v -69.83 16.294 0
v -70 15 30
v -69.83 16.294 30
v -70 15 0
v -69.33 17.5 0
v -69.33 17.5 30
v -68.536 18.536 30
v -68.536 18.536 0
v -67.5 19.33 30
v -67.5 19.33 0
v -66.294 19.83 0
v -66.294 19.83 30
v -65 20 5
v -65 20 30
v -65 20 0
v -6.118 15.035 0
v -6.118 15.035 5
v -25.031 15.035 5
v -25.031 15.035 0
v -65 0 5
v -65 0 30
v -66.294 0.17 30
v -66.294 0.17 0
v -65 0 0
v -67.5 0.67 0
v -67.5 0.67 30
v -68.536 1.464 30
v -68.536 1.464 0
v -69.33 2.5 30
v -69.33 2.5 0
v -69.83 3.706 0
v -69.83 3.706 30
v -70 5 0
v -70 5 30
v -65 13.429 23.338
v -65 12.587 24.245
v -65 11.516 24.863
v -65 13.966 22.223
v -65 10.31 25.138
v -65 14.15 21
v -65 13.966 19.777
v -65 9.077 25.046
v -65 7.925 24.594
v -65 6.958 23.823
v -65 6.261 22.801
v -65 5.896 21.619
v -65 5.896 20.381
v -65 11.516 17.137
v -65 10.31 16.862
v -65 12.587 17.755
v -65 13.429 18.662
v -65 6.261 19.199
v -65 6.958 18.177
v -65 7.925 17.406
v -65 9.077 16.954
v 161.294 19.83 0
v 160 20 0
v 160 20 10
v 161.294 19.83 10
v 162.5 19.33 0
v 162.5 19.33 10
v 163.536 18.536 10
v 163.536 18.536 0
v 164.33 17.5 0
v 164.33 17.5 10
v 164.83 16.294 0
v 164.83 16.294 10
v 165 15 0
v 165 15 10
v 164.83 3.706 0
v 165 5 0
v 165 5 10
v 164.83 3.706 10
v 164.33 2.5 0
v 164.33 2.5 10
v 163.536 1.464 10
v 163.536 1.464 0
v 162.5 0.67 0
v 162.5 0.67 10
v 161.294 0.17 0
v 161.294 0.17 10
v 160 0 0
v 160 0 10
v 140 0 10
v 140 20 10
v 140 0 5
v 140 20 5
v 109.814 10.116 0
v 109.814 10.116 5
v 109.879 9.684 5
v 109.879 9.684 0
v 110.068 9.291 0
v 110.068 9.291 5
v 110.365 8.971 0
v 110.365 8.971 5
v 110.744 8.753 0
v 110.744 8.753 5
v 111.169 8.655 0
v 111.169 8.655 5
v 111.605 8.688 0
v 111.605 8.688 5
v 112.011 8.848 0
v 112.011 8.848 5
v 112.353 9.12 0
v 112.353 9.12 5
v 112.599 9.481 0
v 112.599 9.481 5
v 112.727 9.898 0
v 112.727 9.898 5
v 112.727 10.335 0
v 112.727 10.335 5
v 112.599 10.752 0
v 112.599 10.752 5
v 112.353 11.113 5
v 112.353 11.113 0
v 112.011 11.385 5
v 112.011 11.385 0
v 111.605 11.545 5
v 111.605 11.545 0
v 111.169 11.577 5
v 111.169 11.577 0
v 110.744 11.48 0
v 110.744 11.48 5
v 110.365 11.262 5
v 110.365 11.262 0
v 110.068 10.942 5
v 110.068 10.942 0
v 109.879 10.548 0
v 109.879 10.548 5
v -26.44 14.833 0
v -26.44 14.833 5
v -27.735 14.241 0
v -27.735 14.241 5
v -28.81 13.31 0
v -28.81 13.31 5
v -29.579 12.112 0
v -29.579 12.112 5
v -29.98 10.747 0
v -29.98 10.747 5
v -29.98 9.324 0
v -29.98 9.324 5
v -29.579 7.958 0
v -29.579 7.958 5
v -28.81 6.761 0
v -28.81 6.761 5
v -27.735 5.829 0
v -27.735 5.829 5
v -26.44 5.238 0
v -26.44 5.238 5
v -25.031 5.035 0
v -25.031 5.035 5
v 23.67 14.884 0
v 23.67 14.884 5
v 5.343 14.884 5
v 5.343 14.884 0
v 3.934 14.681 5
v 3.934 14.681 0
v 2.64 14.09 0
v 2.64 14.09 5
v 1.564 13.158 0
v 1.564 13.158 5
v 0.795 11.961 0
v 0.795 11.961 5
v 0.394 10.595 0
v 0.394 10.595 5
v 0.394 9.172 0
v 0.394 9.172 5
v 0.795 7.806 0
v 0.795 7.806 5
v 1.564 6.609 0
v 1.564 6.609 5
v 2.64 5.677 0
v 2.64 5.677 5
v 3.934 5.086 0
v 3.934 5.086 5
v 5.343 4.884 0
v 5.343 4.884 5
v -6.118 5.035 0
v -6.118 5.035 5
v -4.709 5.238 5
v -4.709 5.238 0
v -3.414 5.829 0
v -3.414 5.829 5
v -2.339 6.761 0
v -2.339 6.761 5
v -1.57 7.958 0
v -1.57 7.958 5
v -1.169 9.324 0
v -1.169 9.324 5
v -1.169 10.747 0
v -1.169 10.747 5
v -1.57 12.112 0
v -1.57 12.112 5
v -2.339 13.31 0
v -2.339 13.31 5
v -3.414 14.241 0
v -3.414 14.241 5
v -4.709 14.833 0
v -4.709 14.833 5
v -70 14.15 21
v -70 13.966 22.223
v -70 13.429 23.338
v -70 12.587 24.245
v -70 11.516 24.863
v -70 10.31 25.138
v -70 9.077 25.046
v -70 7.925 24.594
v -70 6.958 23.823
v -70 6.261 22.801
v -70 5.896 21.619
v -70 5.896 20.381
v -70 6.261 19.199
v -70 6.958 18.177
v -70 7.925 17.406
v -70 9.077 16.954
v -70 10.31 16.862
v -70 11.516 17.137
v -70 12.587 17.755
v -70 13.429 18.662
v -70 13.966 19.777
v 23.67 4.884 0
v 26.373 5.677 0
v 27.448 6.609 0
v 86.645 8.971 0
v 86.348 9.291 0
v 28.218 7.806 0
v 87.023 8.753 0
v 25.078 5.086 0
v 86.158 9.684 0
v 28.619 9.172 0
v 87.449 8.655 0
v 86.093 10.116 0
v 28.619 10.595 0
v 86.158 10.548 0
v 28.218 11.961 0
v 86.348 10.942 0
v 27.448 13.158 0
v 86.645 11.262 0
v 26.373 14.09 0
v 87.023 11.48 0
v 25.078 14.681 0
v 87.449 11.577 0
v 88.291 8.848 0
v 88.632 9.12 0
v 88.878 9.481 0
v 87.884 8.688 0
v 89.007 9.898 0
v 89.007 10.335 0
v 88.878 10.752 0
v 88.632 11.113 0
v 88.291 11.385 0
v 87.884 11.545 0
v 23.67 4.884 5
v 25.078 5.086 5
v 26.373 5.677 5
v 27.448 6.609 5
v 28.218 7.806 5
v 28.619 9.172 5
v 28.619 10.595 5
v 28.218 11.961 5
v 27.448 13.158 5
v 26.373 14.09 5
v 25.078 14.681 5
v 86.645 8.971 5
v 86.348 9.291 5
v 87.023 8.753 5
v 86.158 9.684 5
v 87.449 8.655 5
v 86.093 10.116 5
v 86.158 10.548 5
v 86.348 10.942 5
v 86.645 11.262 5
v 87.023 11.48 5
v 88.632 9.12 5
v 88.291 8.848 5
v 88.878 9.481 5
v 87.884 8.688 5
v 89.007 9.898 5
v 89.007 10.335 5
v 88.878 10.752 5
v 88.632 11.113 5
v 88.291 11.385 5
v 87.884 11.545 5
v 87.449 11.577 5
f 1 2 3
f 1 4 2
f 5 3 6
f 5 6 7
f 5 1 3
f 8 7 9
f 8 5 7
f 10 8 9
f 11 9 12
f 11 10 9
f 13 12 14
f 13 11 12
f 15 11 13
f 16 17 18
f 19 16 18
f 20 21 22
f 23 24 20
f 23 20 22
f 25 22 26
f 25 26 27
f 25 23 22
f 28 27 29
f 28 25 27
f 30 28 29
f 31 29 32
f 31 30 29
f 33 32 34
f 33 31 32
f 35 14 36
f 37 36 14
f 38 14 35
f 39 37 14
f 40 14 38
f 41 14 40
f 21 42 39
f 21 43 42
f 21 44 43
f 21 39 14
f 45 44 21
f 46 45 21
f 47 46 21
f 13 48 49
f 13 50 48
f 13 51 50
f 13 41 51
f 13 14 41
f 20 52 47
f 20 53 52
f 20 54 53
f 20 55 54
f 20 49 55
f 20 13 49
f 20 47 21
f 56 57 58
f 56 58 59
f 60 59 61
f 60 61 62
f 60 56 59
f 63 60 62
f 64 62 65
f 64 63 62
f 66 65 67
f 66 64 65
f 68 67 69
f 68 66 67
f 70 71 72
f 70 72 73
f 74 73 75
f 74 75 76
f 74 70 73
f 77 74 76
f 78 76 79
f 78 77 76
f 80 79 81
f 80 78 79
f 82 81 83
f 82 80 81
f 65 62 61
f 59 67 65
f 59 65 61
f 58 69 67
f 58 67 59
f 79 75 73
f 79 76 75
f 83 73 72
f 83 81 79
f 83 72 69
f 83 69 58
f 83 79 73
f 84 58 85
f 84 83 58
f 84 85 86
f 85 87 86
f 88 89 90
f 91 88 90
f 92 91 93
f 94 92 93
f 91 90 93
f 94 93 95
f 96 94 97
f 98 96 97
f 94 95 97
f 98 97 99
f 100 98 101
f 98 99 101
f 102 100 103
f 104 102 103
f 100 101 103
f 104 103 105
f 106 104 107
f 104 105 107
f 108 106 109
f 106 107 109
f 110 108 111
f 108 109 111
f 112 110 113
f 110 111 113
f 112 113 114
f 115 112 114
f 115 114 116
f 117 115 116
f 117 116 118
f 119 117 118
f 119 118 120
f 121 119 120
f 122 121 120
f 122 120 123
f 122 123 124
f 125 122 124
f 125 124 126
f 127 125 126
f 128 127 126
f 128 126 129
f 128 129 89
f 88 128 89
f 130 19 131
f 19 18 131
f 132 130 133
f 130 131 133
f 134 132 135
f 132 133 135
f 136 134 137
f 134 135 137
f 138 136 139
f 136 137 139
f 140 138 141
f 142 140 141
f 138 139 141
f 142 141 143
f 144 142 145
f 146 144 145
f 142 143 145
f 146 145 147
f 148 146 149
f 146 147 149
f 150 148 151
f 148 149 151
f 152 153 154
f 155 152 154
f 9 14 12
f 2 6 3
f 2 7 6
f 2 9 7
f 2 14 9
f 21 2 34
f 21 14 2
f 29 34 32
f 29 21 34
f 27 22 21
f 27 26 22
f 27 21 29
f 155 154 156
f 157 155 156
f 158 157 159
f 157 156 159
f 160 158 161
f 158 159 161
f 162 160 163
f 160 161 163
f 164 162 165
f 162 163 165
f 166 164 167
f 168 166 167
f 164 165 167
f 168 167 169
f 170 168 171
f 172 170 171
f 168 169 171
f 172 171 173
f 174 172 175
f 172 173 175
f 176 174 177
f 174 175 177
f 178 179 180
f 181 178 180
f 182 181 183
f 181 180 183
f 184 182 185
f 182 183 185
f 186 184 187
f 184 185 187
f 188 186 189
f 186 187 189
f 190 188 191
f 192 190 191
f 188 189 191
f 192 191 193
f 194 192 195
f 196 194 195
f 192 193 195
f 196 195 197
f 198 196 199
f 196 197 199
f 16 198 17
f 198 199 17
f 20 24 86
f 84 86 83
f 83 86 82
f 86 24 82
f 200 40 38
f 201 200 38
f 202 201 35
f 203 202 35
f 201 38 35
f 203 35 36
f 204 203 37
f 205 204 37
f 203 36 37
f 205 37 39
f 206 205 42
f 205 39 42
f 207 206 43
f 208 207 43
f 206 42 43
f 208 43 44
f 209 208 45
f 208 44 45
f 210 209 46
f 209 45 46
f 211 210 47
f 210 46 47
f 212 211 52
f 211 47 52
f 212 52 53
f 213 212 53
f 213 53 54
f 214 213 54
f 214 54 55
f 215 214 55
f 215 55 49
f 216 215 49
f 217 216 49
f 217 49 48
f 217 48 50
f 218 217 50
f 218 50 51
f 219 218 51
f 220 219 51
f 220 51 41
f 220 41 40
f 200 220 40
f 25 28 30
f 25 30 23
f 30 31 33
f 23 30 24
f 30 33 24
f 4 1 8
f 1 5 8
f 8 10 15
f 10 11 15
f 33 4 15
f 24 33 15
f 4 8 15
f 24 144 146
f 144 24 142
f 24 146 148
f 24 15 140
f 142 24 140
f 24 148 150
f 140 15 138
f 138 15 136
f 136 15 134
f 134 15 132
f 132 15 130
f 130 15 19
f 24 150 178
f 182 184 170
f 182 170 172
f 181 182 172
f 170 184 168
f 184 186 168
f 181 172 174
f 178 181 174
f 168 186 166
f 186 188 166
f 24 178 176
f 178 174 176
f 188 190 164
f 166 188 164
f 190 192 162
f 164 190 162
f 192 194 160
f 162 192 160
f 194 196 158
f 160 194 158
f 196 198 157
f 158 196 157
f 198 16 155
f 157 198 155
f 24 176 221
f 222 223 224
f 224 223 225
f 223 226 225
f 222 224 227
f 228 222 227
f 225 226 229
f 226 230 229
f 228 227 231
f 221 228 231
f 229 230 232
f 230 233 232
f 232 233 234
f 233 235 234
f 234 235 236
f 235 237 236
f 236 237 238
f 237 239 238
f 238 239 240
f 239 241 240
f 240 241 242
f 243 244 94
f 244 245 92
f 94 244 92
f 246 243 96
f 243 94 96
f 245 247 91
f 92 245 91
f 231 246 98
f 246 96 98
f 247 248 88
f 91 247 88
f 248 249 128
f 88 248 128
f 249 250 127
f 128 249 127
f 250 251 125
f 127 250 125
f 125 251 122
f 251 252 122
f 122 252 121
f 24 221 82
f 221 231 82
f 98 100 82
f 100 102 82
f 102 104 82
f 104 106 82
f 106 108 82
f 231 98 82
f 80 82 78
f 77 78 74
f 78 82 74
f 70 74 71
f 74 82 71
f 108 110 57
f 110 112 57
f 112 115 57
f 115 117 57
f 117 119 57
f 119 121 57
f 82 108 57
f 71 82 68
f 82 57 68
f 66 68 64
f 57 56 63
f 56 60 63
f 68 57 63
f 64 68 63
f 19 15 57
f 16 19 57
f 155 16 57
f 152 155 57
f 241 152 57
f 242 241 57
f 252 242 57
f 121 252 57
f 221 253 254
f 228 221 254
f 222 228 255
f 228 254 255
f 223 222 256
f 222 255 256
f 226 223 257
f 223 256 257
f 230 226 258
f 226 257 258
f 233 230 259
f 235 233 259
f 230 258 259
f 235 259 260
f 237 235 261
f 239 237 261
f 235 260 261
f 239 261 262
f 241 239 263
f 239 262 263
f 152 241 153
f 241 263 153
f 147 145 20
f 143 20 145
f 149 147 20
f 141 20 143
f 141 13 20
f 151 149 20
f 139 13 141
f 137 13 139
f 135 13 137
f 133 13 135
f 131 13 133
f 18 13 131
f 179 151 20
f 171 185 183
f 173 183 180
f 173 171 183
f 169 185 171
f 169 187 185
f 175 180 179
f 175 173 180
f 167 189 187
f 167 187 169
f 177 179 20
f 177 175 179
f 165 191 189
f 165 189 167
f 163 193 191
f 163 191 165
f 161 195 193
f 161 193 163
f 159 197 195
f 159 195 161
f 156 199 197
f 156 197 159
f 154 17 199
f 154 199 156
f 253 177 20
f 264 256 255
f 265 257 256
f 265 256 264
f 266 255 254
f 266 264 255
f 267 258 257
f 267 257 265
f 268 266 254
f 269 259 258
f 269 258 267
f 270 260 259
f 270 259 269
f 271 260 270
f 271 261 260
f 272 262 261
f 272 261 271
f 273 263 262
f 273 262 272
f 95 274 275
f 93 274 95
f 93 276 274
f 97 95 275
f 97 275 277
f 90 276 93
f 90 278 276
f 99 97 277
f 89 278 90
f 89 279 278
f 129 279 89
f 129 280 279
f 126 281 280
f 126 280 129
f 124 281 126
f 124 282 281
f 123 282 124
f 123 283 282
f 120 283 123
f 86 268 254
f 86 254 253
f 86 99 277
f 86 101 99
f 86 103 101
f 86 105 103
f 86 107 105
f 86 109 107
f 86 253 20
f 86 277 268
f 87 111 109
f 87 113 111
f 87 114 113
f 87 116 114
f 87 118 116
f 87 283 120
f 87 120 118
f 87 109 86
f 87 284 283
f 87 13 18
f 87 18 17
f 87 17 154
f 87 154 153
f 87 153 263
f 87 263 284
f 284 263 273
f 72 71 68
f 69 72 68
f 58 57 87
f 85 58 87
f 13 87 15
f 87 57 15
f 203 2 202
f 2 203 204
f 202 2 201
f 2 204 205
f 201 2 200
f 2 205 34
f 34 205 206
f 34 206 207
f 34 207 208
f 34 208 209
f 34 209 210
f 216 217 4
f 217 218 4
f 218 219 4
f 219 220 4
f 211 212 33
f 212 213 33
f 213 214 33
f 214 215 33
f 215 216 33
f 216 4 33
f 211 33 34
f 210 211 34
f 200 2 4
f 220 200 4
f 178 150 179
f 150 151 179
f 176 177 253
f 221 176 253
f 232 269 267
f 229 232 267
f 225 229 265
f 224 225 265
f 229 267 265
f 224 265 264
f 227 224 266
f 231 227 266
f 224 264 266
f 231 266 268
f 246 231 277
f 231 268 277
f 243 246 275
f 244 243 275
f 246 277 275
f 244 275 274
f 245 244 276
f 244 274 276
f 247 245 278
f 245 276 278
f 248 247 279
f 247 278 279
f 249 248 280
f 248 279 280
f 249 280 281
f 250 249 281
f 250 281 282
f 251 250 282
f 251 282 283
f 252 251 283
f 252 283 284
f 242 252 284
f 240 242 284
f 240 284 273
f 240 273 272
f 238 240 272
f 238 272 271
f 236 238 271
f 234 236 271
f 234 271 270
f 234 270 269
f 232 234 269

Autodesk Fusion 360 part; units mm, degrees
sketch "Sketch1" plane through (0, 0, 0) normal (0, 0, 1) x (1, 0, 0)
  line L0 (-70, 20) -> (165, 20)
  line L1 (165, 20) -> (165, 0)
  line L2 (165, 0) -> (-70, 0)
  line L3 (-70, 0) -> (-70, 20)
  dimension "d1" = 235
  dimension "d2" = 20
extrude "Extrude1" add sketch "Sketch1" along normal blind 5
sketch "Sketch2" plane through (0, 0, 5) normal (0, 0, 1) x (-1, 0, 0)
  line L0 (70, 0) -> (-165, 0)
  line L1 (-165, 0) -> (-165, -20)
  line L2 (-165, -20) -> (70, -20)
  line L3 (70, -20) -> (70, 0)
  circle A0 centre (-87.5581, -10.1163) radius 2.5
  circle A1 centre (-111.2788, -10.1163) radius 2.5
  line L4 (25.0313, -5.0352) -> (6.1177, -5.0352)
  arc A2 (6.1177, -5.0352) -> (6.1177, -15.0352) centre (6.1177, -10.0352) ccw
  line L5 (6.1177, -15.0352) -> (25.0313, -15.0352)
  arc A3 (25.0313, -15.0352) -> (25.0313, -5.0352) centre (25.0313, -10.0352) ccw
  line L6 (25.0313, -10.0352) -> (6.1177, -10.0352) construction
  line L7 (-5.3429, -4.8835) -> (-23.6696, -4.8835)
  arc A4 (-23.6696, -4.8835) -> (-23.6696, -14.8835) centre (-23.6696, -9.8835) ccw
  line L8 (-23.6696, -14.8835) -> (-5.3429, -14.8835)
  arc A5 (-5.3429, -14.8835) -> (-5.3429, -4.8835) centre (-5.3429, -9.8835) ccw
  line L9 (-5.3429, -9.8835) -> (-23.6696, -9.8835) construction
  point P0 (6.1177, -10.0352)
  dimension "d5" = 5
  dimension "d6" = 5
  dimension "d7" = 10
  dimension "d8" = 10
extrude "Extrude2" cut sketch "Sketch2" against normal blind 20 contours A0 | A1 | L4 A2 L5 A3 | L7 A4 L8 A5
fillet "Fillet1" radius 5 4 edges at (165, 0, 2.5) (165, 20, 2.5) (-70, 20, 2.5) (-70, 0, 2.5)
sketch "Sketch3" plane through (0, 0, 5) normal (0, 0, 1) x (-1, 0, 0)
  arc A0 (70, -5) -> (65, 0) centre (65, -5) ccw
  line L0 (65, 0) -> (-160, 0)
  arc A1 (-160, 0) -> (-165, -5) centre (-160, -5) ccw
  line L1 (-165, -5) -> (-165, -15)
  arc A2 (-165, -15) -> (-160, -20) centre (-160, -15) ccw
  line L2 (-160, -20) -> (65, -20)
  arc A3 (65, -20) -> (70, -15) centre (65, -15) ccw
  line L3 (70, -15) -> (70, -5)
  line L4 (6.1177, -5.0352) -> (25.0313, -5.0352)
  arc A4 (25.0313, -15.0352) -> (25.0313, -5.0352) centre (25.0313, -10.0352) ccw
  line L5 (25.0313, -15.0352) -> (6.1177, -15.0352)
  arc A5 (6.1177, -5.0352) -> (6.1177, -15.0352) centre (6.1177, -10.0352) ccw
  circle A6 centre (-111.2788, -10.1163) radius 2.5
  line L6 (-23.6696, -4.8835) -> (-5.3429, -4.8835)
  arc A7 (-5.3429, -14.8835) -> (-5.3429, -4.8835) centre (-5.3429, -9.8835) ccw
  line L7 (-5.3429, -14.8835) -> (-23.6696, -14.8835)
  arc A8 (-23.6696, -4.8835) -> (-23.6696, -14.8835) centre (-23.6696, -9.8835) ccw
  circle A9 centre (-87.5581, -10.1163) radius 2.5
  line L8 (-165, -20) -> (-140, -20)
  line L9 (-140, -20) -> (-140, 0)
  line L10 (-140, 0) -> (-165, 0)
  line L11 (-165, 0) -> (-165, -20)
  dimension "d13" = 25
  dimension "d14" = 20
extrude "Extrude3" add sketch "Sketch3" along normal blind 5 contours L0 A1 L1 A2 L2 L8 L9 L10 L11
sketch "Sketch4" plane through (0, 0, 5) normal (0, 0, 1) x (-1, 0, 0)
  line L0 (-140, 0) -> (-140, -20)
  line L1 (-140, -20) -> (65, -20)
  arc A0 (65, -20) -> (70, -15) centre (65, -15) ccw
  line L2 (70, -15) -> (70, -5)
  arc A1 (70, -5) -> (65, 0) centre (65, -5) ccw
  line L3 (65, 0) -> (-140, 0)
  line L4 (6.1177, -5.0352) -> (25.0313, -5.0352)
  arc A2 (25.0313, -15.0352) -> (25.0313, -5.0352) centre (25.0313, -10.0352) ccw
  line L5 (25.0313, -15.0352) -> (6.1177, -15.0352)
  arc A3 (6.1177, -5.0352) -> (6.1177, -15.0352) centre (6.1177, -10.0352) ccw
  circle A4 centre (-111.2788, -10.1163) radius 2.5
  line L6 (-23.6696, -4.8835) -> (-5.3429, -4.8835)
  arc A5 (-5.3429, -14.8835) -> (-5.3429, -4.8835) centre (-5.3429, -9.8835) ccw
  line L7 (-5.3429, -14.8835) -> (-23.6696, -14.8835)
  arc A6 (-23.6696, -4.8835) -> (-23.6696, -14.8835) centre (-23.6696, -9.8835) ccw
  circle A7 centre (-87.5581, -10.1163) radius 2.5
  line L8 (70, -20) -> (65, -20)
  line L9 (65, -20) -> (65, 0)
  line L10 (65, 0) -> (70, 0)
  line L11 (70, 0) -> (70, -20)
  dimension "d17" = 5
  dimension "d18" = 20
extrude "Extrude4" add sketch "Sketch4" along normal blind 25 contours A0 L2 A1 L9 L11
sketch "Sketch5" plane through (-65, 0, 0) normal (1, 0, 0) x (0, 1, 0)
  line L0 (0, 5) -> (20, 5)
  line L1 (20, 5) -> (20, 30)
  line L2 (20, 30) -> (0, 30)
  line L3 (0, 30) -> (0, 5)
  circle A0 centre (10, 21) radius 4.15
  dimension "d21" = 8.3
  dimension "d22" = 16
extrude "Extrude5" cut sketch "Sketch5" against normal blind 6 contours A0
thread "Thread1" "ISO Metric profile 3.5 M3.5x0.6 6H" major diameter 3.5995 minor diameter 2.93 pitch 0.6 angle 60 resizes the face on face at (85.0705, 10.3652, 3.3333)
thread "Thread2" "ISO Metric profile 3.5 M3.5x0.6 6H" major diameter 3.5995 minor diameter 2.93 pitch 0.6 angle 60 resizes the face on face at (108.7912, 10.3652, 3.3333)
